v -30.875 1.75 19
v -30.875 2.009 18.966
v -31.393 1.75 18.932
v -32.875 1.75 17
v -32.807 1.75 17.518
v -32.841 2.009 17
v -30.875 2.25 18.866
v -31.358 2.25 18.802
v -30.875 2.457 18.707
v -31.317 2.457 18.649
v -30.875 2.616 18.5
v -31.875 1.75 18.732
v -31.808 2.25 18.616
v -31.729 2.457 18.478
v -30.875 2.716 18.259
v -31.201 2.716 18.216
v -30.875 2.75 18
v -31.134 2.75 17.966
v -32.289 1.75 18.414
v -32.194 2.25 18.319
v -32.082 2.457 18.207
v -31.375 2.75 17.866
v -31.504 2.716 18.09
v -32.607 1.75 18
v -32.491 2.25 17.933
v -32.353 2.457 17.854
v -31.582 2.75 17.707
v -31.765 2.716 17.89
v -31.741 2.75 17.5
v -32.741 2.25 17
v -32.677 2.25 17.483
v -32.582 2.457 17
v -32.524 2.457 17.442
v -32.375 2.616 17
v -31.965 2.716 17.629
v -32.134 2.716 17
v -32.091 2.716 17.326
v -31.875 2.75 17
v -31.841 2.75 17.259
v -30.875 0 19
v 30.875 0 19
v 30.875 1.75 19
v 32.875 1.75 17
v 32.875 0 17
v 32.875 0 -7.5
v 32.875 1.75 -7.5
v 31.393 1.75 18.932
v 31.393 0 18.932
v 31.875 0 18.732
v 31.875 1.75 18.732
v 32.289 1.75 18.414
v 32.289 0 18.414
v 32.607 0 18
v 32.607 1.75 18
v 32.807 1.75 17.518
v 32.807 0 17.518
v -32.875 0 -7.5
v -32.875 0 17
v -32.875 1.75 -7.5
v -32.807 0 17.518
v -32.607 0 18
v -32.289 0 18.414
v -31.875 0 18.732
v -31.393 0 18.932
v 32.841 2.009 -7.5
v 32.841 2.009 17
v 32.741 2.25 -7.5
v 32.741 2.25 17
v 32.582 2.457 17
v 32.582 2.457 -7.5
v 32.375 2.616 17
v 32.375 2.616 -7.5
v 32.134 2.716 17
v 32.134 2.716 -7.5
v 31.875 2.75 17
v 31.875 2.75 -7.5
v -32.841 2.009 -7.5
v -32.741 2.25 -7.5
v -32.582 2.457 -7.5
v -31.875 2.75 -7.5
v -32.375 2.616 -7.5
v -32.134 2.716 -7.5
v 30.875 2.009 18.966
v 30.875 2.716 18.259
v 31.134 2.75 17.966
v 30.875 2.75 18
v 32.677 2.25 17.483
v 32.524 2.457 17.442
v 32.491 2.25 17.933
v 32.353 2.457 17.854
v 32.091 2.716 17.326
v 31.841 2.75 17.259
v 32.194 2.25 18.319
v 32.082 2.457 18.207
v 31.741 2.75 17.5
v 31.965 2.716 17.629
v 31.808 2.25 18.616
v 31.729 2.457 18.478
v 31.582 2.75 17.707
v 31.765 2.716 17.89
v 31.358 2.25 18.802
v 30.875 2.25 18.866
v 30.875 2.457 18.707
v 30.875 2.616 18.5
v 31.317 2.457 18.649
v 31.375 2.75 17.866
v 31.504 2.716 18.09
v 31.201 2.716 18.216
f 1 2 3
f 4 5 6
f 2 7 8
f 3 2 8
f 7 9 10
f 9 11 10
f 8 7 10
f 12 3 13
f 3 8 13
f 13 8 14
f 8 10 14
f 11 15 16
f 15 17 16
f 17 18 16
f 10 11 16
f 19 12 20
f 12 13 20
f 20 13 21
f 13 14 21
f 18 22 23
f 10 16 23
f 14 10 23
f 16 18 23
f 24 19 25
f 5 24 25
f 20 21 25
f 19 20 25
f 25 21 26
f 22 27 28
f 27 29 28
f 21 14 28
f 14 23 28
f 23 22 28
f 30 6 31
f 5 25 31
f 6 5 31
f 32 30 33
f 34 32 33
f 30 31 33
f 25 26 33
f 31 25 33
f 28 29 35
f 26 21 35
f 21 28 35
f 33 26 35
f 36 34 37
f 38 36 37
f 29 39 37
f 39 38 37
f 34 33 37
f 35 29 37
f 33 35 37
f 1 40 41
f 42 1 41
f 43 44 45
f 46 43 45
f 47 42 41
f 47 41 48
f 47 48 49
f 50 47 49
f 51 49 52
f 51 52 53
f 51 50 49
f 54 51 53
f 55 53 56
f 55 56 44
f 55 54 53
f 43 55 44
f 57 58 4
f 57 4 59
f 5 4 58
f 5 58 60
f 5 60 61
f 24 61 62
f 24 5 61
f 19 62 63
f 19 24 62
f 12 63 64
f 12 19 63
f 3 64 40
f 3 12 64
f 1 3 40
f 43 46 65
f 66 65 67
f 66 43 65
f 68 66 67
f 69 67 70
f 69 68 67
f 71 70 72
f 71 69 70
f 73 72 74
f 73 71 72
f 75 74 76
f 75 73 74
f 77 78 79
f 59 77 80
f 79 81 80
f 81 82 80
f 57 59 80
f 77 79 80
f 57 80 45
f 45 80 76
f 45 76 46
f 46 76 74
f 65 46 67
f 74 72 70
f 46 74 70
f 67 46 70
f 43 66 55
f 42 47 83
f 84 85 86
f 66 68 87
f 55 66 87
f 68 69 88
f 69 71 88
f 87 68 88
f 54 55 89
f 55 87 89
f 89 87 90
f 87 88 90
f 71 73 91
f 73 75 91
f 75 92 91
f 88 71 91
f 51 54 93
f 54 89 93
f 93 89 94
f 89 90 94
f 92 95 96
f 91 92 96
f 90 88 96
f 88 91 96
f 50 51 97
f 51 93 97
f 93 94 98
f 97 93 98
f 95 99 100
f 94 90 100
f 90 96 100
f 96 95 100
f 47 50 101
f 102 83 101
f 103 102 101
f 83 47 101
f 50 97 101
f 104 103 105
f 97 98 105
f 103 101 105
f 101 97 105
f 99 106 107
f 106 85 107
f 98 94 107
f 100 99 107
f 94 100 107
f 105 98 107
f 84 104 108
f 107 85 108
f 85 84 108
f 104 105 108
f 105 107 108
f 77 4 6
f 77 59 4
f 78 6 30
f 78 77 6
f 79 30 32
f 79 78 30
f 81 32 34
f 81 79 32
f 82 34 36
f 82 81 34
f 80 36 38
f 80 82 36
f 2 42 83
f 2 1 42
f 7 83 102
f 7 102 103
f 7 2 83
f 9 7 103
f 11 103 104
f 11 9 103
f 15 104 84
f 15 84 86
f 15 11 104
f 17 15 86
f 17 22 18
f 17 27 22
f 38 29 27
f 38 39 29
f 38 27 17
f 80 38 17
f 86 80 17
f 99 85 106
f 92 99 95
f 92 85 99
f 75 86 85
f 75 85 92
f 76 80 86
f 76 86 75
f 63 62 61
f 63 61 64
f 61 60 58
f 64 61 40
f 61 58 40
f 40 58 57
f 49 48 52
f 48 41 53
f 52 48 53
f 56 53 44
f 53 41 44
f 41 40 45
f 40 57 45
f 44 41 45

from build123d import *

# Parameters (mm, degrees)
SKETCH1_W           = 65.75
SKETCH1_H           = 38
BOSS_EXTRUDE1_DEPTH = 2.75
SKETCH3_W           = 65.75
SKETCH3_H           = 11.5
CUT_EXTRUDE1_DEPTH  = 39.070042356
FILLET1_R           = 2
FILLET2_R           = 1


with BuildPart() as part:
    # Sketch1 → Boss-Extrude1 (new body)
    with BuildSketch(Plane(origin=(0, 0, 0), x_dir=(1, 0, 0), z_dir=(0, 1, 0))):
        Rectangle(SKETCH1_W, SKETCH1_H)
    extrude(amount=BOSS_EXTRUDE1_DEPTH)

    # Sketch3 → Cut-Extrude1 (cut, through all)
    with BuildSketch(Plane(origin=(0, 2.75, 0), x_dir=(1, 0, 0), z_dir=(0, 1, 0))):
        with Locations((0, 13.25)):
            Rectangle(SKETCH3_W, SKETCH3_H)
    extrude(amount=-CUT_EXTRUDE1_DEPTH, mode=Mode.SUBTRACT)

    # Fillet1
    fillet1_edges = [part.edges().sort_by_distance(p)[0] for p in [
        (32.875, 1.375, 19),
        (-32.875, 1.375, 19),
    ]]
    fillet(fillet1_edges, radius=FILLET1_R)

    # Fillet2
    fillet2_edges = [part.edges().sort_by_distance(p)[0] for p in [
        (-32.875, 2.75, 4.75),
        (0, 2.75, 19),
        (32.875, 2.75, 4.75),
        (32.289213562, 2.75, 18.414213562),
        (-32.289213562, 2.75, 18.414213562),
    ]]
    fillet(fillet2_edges, radius=FILLET2_R)


solid = part.part
